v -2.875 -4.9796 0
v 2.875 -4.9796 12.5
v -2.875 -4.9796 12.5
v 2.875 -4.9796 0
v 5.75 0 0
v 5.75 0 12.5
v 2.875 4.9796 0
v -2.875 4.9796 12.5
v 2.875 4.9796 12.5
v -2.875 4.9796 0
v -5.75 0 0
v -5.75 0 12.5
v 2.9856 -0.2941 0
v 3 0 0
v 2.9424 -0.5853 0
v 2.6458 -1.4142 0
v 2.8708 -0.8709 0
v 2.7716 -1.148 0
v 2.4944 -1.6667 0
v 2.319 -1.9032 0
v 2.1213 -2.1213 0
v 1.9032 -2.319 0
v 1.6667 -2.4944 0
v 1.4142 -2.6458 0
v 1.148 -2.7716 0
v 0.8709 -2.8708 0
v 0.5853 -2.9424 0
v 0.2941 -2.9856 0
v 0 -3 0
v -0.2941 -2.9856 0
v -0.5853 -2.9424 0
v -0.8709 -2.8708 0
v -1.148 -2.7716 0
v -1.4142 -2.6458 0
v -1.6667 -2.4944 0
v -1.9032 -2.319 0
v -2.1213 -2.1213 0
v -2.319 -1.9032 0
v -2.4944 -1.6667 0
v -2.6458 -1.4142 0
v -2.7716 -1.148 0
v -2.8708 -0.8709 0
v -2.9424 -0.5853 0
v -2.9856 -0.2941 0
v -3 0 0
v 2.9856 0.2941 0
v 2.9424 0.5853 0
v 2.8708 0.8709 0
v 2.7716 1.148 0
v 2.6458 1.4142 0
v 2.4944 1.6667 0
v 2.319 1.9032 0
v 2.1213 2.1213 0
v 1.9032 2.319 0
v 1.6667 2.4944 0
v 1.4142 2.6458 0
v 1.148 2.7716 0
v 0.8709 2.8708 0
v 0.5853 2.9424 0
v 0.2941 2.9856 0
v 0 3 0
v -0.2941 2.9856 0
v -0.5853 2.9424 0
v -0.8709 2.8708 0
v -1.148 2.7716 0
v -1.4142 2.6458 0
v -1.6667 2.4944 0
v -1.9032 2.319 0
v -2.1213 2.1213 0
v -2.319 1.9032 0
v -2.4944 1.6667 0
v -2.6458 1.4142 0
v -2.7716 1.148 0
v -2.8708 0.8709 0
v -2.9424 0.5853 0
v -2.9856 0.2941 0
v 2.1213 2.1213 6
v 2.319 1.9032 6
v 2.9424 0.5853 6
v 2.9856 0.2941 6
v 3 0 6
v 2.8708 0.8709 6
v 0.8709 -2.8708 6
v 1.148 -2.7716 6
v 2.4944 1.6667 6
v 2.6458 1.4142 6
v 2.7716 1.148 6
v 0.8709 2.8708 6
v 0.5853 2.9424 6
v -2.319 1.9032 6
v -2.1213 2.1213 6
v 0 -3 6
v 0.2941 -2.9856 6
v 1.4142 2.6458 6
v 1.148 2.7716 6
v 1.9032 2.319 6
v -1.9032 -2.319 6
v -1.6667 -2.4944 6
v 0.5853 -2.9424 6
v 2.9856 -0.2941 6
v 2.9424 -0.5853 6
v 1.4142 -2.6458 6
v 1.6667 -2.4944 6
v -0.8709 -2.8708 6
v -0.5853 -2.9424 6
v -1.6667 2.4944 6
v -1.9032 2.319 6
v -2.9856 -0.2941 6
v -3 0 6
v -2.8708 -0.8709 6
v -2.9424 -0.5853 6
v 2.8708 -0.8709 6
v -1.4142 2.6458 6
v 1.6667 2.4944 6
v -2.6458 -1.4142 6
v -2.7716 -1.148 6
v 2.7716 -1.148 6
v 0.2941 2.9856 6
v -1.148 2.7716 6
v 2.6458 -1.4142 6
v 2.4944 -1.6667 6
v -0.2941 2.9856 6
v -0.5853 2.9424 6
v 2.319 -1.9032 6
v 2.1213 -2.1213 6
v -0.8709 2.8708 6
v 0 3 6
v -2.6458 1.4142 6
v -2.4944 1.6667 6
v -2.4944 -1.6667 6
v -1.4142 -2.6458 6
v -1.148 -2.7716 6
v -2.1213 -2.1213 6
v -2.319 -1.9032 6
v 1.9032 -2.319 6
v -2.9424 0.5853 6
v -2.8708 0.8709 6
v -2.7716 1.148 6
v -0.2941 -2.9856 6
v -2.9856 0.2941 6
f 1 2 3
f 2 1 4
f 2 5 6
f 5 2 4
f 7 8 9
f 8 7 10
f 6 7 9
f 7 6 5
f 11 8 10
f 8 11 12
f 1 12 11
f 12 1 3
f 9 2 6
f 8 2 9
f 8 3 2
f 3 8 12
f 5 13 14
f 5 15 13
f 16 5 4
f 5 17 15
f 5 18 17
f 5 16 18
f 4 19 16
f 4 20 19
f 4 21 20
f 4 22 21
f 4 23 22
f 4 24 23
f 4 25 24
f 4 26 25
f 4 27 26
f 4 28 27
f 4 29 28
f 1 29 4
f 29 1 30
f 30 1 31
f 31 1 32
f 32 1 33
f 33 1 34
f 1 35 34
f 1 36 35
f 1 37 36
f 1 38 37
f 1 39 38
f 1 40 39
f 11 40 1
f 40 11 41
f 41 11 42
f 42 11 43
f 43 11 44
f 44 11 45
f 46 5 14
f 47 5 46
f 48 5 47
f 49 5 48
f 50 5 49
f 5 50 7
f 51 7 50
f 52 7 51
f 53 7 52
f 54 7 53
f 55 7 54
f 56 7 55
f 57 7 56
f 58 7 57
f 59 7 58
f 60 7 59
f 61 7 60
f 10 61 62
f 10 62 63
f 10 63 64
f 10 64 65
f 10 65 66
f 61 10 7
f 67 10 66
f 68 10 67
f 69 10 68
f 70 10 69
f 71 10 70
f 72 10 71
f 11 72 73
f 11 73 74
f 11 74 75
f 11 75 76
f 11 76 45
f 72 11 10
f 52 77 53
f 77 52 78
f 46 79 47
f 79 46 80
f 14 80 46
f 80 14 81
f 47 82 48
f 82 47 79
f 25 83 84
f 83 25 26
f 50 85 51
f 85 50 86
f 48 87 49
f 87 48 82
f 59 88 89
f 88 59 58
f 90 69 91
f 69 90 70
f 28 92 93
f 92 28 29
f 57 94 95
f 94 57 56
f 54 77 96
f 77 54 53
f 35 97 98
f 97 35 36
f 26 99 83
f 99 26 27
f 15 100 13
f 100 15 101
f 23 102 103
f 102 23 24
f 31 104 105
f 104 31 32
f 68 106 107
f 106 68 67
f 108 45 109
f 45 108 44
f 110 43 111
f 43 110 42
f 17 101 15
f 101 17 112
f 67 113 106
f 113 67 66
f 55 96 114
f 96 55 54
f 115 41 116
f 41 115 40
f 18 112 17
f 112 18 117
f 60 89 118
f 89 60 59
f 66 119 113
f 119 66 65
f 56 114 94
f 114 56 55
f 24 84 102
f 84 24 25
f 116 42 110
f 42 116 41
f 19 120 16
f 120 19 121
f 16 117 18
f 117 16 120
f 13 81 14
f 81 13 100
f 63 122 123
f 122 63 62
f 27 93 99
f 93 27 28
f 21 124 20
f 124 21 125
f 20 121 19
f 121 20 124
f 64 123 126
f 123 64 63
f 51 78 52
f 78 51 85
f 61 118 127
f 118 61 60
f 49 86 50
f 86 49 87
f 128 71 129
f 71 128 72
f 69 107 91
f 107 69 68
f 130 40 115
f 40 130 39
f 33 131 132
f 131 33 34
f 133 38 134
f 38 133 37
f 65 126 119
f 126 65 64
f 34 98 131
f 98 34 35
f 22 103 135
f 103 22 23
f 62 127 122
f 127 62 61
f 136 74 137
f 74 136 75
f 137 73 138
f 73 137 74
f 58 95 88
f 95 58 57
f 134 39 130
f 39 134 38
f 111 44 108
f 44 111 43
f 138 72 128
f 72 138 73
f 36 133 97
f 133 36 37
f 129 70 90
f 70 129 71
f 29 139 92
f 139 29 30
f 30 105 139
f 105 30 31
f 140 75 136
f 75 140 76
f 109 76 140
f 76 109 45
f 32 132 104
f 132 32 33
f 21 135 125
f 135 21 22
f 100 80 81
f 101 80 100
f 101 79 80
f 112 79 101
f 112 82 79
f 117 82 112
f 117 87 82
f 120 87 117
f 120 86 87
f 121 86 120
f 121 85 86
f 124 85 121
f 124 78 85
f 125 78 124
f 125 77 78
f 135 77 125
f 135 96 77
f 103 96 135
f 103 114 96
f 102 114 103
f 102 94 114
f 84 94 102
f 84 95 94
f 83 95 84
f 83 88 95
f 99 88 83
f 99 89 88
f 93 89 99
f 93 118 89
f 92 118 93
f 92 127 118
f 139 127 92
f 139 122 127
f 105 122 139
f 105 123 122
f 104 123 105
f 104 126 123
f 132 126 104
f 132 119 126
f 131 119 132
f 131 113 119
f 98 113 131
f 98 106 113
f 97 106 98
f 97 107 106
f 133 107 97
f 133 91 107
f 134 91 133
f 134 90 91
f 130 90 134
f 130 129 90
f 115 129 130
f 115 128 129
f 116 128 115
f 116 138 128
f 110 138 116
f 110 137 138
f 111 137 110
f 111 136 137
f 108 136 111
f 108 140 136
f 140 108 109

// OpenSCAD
module hex_nut() {
    difference() {
        // Hexagon shape
        scale([11.5/2, 11.5/2, 5.0/2])
            cylinder(h=5.0, r=1, $fn=6);
        // Central hole for the screw
        translate([0, 0, -1])
            cylinder(h=7.0, r=3.0, $fn=64);
    }
}

hex_nut();
